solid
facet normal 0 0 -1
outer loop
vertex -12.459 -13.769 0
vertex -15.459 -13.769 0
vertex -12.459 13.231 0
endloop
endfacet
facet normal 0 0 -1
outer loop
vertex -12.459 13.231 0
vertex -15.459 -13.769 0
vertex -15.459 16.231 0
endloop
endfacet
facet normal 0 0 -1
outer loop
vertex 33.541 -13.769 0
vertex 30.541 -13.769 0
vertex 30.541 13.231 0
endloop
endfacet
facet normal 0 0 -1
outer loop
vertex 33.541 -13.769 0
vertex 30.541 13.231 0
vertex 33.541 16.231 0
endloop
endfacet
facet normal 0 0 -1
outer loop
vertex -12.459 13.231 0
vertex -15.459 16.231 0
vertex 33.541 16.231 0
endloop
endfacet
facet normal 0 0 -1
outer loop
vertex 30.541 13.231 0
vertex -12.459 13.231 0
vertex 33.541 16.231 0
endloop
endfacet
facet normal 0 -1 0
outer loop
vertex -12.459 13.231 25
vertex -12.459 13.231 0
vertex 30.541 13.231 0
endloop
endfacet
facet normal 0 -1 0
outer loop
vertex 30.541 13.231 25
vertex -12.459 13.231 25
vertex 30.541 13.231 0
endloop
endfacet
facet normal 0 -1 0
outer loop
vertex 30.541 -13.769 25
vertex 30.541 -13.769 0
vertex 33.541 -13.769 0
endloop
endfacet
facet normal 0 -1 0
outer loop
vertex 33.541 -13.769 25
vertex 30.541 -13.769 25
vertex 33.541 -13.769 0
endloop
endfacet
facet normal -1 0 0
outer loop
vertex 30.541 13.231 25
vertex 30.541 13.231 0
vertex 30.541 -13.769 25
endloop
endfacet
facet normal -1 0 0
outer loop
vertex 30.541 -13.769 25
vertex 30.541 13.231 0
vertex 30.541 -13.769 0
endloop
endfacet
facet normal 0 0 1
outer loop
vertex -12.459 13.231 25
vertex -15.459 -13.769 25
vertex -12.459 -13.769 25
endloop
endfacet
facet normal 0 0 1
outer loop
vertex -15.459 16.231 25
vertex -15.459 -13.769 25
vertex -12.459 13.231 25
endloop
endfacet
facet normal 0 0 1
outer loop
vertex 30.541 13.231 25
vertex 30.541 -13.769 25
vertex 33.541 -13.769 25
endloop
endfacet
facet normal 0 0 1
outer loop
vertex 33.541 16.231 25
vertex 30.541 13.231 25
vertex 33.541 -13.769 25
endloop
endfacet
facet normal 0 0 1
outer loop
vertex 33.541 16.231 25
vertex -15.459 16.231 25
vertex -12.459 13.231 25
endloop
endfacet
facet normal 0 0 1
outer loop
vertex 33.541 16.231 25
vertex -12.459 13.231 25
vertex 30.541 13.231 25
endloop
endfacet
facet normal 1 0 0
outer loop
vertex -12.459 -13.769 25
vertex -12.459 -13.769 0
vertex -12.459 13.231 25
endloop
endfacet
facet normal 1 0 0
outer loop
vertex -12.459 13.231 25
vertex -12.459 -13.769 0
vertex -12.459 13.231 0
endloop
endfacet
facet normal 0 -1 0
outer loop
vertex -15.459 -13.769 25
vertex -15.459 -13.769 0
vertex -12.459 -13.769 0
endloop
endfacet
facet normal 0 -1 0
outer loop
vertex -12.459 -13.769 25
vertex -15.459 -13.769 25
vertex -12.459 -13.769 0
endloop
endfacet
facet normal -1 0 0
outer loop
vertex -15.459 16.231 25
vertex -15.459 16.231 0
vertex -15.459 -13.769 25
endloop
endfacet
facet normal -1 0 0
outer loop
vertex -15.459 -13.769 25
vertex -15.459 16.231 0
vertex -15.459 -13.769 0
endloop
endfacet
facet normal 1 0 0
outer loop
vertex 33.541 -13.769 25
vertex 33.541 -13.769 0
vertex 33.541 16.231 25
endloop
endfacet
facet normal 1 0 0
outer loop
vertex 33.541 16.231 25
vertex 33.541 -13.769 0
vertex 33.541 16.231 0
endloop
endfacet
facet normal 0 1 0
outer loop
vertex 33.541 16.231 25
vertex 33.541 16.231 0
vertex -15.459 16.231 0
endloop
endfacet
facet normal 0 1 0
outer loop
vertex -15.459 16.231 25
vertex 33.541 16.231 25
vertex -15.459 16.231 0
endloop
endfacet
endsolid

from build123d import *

# Parameters (mm, degrees)
F0_W     = 43
F0_H     = 3
F1_DEPTH = 25


with BuildPart() as f1:
    # F0 (on Top) → F1 (new body)
    with BuildSketch(Plane.XY):
        with Locations((9.041131, 14.730754)):
            Rectangle(F0_W, F0_H)
        Polygon((-12.458869, 13.230754), (-12.458869, 16.230754), (-15.458869, 16.230754), (-15.458869, -13.769246), (-12.458869, -13.769246), align=None)
        Polygon((33.541131, 16.230754), (30.541131, 16.230754), (30.541131, 13.230754), (30.541131, -13.769246), (33.541131, -13.769246), align=None)
    extrude(amount=F1_DEPTH)


solid = f1.part
